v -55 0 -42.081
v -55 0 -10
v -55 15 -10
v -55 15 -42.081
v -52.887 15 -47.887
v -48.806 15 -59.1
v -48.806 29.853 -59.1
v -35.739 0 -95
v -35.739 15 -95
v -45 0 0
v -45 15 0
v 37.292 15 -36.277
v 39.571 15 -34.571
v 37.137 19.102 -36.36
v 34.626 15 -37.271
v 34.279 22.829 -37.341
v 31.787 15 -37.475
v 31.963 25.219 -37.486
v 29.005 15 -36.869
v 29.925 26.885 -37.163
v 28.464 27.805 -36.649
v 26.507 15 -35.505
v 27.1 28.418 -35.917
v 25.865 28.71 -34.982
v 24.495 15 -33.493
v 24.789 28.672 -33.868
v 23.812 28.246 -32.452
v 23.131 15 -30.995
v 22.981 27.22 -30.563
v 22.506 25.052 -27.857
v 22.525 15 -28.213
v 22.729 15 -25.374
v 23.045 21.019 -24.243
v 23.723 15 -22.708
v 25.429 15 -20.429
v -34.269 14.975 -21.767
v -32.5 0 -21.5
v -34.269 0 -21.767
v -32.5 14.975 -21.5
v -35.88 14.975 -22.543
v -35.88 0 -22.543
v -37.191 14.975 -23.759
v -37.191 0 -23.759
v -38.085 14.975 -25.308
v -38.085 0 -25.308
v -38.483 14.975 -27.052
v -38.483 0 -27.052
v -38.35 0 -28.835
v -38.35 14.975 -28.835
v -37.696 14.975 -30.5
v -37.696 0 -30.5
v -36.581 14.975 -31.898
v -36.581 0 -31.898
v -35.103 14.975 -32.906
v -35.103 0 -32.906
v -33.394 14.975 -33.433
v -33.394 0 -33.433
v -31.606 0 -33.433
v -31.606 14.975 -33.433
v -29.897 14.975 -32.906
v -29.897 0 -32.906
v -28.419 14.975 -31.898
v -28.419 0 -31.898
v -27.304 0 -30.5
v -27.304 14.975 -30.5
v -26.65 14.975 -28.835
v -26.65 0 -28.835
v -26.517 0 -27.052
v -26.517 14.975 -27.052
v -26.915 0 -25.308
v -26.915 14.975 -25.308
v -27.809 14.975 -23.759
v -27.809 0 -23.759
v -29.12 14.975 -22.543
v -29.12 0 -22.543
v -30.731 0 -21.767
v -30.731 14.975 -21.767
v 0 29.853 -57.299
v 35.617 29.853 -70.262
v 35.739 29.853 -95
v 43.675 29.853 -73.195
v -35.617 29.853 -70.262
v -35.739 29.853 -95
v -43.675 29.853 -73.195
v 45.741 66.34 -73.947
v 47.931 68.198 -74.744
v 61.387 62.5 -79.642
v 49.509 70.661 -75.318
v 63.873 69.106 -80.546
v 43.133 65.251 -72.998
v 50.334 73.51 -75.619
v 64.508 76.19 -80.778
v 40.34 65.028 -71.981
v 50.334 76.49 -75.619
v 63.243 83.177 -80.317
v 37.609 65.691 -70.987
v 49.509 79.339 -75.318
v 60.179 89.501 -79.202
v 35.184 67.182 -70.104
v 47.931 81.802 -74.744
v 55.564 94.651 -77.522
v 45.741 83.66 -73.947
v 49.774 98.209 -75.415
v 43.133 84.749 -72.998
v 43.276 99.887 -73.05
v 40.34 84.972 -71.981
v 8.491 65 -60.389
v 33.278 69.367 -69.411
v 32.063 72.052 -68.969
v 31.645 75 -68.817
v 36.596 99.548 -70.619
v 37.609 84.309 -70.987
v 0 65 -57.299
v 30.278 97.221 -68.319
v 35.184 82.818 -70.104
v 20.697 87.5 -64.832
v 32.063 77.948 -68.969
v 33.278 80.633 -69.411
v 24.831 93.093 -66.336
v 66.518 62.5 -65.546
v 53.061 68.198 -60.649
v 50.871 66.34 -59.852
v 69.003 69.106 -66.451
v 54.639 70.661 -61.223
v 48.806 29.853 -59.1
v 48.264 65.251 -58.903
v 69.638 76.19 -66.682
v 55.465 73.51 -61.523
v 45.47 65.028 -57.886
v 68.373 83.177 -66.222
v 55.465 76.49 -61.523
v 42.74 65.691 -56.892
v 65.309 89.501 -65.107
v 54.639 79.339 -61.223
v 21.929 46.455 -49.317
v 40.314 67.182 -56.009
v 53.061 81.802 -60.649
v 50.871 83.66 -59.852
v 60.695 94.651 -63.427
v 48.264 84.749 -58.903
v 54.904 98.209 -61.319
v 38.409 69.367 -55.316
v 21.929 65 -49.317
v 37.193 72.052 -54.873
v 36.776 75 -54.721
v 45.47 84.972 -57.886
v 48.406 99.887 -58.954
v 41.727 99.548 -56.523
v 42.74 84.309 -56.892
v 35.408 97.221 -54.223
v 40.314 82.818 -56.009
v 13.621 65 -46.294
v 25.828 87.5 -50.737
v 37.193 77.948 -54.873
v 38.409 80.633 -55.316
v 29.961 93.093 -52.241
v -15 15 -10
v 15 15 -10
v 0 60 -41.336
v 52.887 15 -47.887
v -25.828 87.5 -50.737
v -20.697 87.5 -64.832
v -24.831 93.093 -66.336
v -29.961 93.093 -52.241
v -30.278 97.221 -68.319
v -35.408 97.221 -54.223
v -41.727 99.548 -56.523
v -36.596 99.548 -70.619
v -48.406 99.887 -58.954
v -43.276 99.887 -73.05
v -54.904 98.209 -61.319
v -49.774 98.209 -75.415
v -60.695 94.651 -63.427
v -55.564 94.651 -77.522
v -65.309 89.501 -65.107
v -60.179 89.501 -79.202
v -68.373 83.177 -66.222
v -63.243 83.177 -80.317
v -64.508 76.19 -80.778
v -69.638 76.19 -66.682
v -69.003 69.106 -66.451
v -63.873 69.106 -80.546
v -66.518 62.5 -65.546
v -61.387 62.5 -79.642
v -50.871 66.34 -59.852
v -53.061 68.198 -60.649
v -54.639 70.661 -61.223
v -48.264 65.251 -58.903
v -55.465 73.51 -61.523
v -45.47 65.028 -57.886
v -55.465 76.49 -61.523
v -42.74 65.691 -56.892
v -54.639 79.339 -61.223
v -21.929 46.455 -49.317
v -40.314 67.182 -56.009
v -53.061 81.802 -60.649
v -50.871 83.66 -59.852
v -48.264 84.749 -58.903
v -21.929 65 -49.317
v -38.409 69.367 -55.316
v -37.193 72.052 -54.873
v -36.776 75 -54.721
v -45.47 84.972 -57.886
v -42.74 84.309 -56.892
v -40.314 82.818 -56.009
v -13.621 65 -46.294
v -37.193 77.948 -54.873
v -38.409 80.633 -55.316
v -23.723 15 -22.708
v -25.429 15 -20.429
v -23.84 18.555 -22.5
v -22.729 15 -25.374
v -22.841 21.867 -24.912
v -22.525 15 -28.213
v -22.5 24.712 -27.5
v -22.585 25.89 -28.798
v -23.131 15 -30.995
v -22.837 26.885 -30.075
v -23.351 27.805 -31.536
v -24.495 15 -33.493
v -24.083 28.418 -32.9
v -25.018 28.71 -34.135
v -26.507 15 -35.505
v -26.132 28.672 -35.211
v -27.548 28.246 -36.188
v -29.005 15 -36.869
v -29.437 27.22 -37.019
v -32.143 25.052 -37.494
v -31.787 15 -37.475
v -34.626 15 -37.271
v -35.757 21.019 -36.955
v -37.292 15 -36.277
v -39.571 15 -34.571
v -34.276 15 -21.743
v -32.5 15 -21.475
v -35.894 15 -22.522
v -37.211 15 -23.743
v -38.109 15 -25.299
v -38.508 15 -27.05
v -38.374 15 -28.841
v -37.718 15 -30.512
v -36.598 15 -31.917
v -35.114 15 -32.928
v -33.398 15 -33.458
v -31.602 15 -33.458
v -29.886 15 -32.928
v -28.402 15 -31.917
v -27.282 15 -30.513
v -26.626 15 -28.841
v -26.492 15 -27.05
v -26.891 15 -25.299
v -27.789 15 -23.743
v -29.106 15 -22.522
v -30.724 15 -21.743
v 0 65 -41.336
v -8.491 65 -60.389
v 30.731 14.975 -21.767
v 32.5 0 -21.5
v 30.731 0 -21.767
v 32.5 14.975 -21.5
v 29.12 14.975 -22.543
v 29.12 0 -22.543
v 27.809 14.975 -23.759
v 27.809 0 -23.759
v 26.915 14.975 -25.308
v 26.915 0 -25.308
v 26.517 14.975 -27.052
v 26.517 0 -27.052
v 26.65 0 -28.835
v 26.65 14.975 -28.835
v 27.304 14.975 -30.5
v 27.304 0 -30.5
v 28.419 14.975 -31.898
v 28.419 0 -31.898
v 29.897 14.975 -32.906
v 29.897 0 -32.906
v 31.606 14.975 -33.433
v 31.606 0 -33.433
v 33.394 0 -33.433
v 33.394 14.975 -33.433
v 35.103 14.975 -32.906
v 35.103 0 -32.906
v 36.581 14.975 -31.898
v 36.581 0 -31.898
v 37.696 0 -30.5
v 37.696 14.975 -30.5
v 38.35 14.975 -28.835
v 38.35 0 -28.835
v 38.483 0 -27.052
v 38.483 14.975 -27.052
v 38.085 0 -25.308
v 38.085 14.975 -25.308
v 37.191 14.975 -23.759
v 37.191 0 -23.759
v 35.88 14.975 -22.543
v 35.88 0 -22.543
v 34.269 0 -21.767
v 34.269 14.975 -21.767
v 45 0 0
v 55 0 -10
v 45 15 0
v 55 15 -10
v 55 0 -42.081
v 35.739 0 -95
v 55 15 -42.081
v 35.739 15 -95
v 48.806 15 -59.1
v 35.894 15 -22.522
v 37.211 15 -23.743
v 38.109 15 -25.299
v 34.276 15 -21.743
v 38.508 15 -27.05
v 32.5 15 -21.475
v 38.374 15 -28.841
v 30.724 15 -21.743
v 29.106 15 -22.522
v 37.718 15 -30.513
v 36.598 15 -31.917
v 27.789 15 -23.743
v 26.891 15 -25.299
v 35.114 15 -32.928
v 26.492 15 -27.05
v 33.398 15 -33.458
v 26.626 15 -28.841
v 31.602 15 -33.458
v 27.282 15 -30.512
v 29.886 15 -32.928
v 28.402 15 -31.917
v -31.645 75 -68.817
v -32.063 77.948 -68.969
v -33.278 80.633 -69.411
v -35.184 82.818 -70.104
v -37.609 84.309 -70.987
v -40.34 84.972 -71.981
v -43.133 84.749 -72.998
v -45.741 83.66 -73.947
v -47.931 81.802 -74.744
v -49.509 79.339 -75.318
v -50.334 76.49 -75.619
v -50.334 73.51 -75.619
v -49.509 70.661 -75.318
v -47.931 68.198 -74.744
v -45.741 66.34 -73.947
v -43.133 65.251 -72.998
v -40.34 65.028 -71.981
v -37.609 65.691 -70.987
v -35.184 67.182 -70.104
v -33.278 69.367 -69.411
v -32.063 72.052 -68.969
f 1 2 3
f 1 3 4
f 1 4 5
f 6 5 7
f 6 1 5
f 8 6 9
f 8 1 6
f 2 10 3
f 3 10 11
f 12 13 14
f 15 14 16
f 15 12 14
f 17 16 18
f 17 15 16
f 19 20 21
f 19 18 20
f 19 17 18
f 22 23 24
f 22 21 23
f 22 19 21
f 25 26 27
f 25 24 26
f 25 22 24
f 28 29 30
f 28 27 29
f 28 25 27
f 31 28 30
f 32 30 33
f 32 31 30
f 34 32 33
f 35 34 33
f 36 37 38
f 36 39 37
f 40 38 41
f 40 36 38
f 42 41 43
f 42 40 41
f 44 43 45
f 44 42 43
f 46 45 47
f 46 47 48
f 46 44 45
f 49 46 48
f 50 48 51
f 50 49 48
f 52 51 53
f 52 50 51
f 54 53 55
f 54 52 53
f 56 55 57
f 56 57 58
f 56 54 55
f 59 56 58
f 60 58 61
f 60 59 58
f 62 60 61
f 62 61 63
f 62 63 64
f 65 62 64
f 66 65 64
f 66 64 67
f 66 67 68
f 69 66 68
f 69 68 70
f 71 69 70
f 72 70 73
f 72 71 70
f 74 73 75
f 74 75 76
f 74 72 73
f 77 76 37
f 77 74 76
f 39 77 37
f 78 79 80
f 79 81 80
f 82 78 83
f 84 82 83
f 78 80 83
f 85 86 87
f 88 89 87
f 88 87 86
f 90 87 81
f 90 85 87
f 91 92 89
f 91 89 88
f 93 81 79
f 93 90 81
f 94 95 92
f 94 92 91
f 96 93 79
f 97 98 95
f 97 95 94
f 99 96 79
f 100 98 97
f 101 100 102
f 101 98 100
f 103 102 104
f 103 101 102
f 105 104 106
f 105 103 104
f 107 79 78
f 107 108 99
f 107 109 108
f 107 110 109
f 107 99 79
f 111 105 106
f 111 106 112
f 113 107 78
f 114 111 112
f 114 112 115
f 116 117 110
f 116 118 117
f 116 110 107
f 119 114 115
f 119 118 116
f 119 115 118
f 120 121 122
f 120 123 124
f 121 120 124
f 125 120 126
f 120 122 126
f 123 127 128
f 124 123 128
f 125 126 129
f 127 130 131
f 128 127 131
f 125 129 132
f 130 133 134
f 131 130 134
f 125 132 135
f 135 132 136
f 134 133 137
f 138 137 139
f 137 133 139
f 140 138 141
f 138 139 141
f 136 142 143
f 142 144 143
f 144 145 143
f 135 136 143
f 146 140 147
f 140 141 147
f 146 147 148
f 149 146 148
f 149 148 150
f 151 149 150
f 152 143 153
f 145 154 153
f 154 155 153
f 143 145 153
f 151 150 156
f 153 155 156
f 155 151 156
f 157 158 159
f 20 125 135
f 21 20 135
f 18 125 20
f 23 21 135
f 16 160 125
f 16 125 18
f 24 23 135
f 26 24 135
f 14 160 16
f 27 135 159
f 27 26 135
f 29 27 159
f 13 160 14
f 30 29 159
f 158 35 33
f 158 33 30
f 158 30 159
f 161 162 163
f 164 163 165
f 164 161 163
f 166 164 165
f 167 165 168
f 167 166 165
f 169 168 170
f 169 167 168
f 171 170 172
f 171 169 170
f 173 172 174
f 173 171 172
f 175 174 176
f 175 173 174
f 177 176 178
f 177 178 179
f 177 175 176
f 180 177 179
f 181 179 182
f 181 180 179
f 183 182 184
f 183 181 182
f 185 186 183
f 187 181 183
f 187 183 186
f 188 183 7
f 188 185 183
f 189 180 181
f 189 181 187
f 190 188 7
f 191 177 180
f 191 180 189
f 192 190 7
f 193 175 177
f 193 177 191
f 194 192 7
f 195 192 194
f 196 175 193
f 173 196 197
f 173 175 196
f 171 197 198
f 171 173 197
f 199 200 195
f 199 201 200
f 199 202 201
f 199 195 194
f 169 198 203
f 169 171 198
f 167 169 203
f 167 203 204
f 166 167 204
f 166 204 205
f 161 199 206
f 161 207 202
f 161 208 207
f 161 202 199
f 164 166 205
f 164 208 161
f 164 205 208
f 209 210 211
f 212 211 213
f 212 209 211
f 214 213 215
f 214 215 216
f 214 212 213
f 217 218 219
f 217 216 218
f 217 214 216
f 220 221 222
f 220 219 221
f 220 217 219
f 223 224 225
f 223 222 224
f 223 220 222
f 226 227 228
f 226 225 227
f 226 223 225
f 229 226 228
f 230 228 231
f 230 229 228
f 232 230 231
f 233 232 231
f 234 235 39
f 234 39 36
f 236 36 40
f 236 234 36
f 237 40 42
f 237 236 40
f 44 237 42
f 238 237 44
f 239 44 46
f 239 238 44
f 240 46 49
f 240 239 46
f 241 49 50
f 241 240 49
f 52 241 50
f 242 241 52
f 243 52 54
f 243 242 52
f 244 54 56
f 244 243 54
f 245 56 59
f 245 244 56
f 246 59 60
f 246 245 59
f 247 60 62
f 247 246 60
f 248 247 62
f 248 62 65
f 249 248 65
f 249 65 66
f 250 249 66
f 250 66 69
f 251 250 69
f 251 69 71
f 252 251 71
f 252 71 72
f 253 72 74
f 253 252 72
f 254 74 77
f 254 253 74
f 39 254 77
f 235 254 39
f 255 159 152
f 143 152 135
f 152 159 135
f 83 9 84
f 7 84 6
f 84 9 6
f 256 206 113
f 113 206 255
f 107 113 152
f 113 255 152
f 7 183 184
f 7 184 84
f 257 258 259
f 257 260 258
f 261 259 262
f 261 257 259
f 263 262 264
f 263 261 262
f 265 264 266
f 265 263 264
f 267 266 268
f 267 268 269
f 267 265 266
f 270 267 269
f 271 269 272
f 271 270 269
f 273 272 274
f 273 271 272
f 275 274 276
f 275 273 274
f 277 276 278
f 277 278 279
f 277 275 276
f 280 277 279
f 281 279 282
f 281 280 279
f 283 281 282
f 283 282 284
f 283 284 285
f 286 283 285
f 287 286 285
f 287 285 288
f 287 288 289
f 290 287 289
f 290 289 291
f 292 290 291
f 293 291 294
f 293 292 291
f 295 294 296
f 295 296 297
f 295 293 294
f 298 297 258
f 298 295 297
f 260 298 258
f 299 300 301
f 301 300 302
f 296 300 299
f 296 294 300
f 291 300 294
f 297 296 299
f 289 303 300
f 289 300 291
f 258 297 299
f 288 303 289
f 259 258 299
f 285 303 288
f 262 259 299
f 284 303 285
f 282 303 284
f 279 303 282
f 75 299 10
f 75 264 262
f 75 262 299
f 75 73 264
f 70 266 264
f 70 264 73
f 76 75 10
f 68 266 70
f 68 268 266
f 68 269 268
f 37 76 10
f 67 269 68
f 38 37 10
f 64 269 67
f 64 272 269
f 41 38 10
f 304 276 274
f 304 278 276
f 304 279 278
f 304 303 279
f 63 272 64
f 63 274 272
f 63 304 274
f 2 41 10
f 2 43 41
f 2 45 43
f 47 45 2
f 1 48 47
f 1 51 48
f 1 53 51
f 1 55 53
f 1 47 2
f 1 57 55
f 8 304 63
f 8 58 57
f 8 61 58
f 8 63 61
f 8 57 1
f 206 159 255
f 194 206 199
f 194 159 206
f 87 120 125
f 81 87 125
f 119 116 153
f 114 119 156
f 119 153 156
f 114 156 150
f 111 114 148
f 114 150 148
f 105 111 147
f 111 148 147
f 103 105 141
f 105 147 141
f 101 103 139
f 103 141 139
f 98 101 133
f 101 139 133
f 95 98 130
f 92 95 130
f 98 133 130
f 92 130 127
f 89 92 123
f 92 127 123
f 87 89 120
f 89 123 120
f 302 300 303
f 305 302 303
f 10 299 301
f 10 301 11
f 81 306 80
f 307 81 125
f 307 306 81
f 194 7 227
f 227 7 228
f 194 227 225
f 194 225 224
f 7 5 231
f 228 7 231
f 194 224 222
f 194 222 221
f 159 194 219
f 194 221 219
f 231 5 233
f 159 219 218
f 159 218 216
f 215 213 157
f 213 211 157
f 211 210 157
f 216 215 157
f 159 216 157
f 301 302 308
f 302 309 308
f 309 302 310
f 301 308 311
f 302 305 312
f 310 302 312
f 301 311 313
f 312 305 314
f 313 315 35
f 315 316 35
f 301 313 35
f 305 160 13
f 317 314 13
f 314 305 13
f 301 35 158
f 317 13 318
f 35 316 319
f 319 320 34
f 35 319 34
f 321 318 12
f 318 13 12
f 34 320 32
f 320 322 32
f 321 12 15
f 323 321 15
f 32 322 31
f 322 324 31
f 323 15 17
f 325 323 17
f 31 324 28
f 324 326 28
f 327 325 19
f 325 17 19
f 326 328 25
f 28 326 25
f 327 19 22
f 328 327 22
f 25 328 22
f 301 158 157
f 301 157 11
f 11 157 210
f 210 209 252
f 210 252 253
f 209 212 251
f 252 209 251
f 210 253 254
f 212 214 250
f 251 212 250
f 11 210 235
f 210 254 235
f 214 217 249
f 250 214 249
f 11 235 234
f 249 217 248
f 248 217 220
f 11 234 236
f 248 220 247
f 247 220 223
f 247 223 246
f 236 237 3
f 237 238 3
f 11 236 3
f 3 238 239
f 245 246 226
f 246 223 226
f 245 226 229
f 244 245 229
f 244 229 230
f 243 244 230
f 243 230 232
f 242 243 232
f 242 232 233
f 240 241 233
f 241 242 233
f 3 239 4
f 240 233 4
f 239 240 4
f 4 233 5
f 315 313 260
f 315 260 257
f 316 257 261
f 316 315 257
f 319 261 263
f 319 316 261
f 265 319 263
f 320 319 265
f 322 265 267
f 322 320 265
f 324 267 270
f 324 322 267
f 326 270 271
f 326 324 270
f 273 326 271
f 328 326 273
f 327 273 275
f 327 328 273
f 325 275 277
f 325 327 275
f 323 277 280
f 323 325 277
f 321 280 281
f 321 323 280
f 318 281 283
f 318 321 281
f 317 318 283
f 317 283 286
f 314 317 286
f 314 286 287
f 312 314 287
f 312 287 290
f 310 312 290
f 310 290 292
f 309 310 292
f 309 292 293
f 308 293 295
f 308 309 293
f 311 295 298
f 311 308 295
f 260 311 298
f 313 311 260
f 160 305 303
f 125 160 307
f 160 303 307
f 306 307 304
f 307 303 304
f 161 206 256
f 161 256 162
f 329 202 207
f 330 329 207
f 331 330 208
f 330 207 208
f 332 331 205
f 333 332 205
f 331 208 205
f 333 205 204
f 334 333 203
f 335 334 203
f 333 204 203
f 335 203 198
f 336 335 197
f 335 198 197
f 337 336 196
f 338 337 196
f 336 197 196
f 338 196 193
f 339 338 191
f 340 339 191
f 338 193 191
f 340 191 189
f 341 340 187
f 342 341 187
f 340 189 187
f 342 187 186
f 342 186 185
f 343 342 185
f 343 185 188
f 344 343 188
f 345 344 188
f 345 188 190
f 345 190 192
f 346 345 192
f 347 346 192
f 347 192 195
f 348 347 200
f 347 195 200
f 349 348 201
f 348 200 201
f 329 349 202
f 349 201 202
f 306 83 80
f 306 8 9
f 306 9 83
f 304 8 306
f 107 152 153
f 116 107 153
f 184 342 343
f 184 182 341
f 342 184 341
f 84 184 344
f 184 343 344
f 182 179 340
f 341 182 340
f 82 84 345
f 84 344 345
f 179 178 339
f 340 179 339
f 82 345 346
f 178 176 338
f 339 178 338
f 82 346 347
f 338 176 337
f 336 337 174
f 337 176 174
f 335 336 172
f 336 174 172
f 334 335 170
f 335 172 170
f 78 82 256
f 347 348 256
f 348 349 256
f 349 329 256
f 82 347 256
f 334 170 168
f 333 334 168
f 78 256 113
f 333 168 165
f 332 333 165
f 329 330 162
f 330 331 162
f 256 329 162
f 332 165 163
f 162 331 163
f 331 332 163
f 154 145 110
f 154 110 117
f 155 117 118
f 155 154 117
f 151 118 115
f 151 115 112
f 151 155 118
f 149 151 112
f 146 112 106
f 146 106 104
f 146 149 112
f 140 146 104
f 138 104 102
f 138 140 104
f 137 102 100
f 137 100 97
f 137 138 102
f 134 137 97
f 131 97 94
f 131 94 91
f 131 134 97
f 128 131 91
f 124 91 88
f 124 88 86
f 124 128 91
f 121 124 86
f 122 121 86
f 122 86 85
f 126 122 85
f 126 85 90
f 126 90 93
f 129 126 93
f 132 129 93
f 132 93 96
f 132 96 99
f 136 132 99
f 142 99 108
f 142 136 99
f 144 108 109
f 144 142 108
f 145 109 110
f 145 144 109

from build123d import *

# Parameters (mm, degrees)
SKETCH1_W                           = 110
SKETCH1_H                           = 95
BOSS_EXTRUDE1_DEPTH                 = 15
SKETCH6_R                           = 25
SKETCH6_R_2                         = 10
BOSS_EXTRUDE7_DEPTH                 = 15
DELETEFACE4_START                   = 15
DELETEFACE4_DEPTH                   = 50
CUT_EXTRUDE1_DEPTH                  = 29.85315
BOSS_EXTRUDE8_DEPTH                 = 14.85315
F_12_0_12_DIAMETER_HOLE1_AT_2_COUNT = 2
F_12_0_12_DIAMETER_HOLE1_AT_2_PITCH = 65
SKETCH17_R                          = 10
CUT_EXTRUDE2_DEPTH                  = 15
CHAMFER1_SIZE                       = 10


# Read off the part's stored shape, not the designer's step: DeleteFace4
with BuildPart() as part:
    # Sketch1 → Boss-Extrude1 (new body)
    with BuildSketch(Plane(origin=(0, 0, 0), x_dir=(1, 0, 0), z_dir=(0, 1, 0))):
        with Locations((0, 47.5)):
            Rectangle(SKETCH1_W, SKETCH1_H)
    extrude(amount=BOSS_EXTRUDE1_DEPTH)

    # Sketch6 → Boss-Extrude7 (add)
    # profile 1 of 3: a face of its own
    with BuildSketch(Plane(origin=(-46.172719349, 75, -58.141496194), x_dir=(0.9396926207859081, 0, 0.34202014332566977), z_dir=(-0.3420201433256697, 0, 0.939692620785908))):
        Circle(SKETCH6_R)
        Circle(SKETCH6_R_2, mode=Mode.SUBTRACT)
    # profile 2 of 3: a face of its own
    with BuildSketch(Plane(origin=(-46.172719349, 75, -58.141496194), x_dir=(0.9396926207859081, 0, 0.34202014332566977), z_dir=(-0.3420201433256697, 0, 0.939692620785908))):
        with BuildLine():
            ThreePointArc((25, 0), (6.470476128, -24.148145657), (-21.650635095, -12.5))
            Line((-21.650635095, -12.5), (5.773502692, -60))
            Line((5.773502692, -60), (63.508529611, -60))
            Line((63.508529611, -60), (34.641016151, -10))
            Line((34.641016151, -10), (21.650635095, 12.5))
            ThreePointArc((21.650635095, 12.5), (24.148145657, 6.470476128), (25, 0))
        make_face()
    # profile 3 of 3: a face of its own
    with BuildSketch(Plane(origin=(-46.172719349, 75, -58.141496194), x_dir=(0.9396926207859081, 0, 0.34202014332566977), z_dir=(-0.3420201433256697, 0, 0.939692620785908))):
        Polygon((34.641016151, -10), (63.508529611, -60), (84.985310553, -60), (84.985310553, -10), align=None)
    boss_extrude7 = extrude(amount=-BOSS_EXTRUDE7_DEPTH)

    # Mirror1: Boss-Extrude7 across plane
    add(boss_extrude7.mirror(Plane(origin=(0, 0, 0), x_dir=(0, 0, 1), z_dir=(1, 0, 0))))

    # DeleteFace4 outline → DeleteFace4 (cut)
    with BuildSketch(Plane(origin=(0, 0, 0), x_dir=(1, 0, 0), z_dir=(0, 1, 0)).offset(DELETEFACE4_START)):
        Polygon((21.928533001, 49.317334009), (0, 41.336000716), (33.687349853, 29.074808098), (38.817652003, 43.17019741), align=None)
        Polygon((0, 41.336000716), (-21.928533001, 49.317334009), (-38.817652003, 43.17019741), (-33.687349853, 29.074808098), align=None)
    extrude(amount=DELETEFACE4_DEPTH, mode=Mode.SUBTRACT)

    # Sketch8 → Loft1 section 0
    with BuildSketch(Plane(origin=(0, 15, 0), x_dir=(1, 0, 0), z_dir=(0, 1, 0)), mode=Mode.PRIVATE) as loft1_s0:
        with BuildLine():
            Line((-15, 10), (15, 10))
            Line((15, 10), (72.85193746, 67.85193746))
            Line((72.85193746, 67.85193746), (0, 41.336000716))
            Line((0, 41.336000716), (-72.85193746, 67.85193746))
            Line((-72.85193746, 67.85193746), (-15, 10))
        make_face()
    loft([Vertex(0, 60, -41.336000716), loft1_s0.sketch])

    # Sketch13 → Cut-Extrude1 (cut)
    with BuildSketch(Plane(origin=(0, 0, 0), x_dir=(1, 0, 0), z_dir=(0, 1, 0))):
        Polygon((-55, 95), (-55, 42.081139662), (-35.739110006, 95), align=None)
    extrude(amount=CUT_EXTRUDE1_DEPTH, mode=Mode.SUBTRACT)


with BuildPart() as cut_extrude1_kept_piece:
    # of the separate pieces the step leaves, the one the design keeps (cut_extrude1_pieces_kept)
    add(part.part.solids().sort_by_distance((-55, 0, 0))[0])

    # Sketch14 → Boss-Extrude8 (add)
    with BuildSketch(Plane(origin=(0, 15, 0), x_dir=(1, 0, 0), z_dir=(0, 1, 0))):
        Polygon((0, 57.298667303), (0, 95), (-35.739110006, 95), (-48.805705227, 59.099824681), (-40.747401473, 56.166841976), (-35.617099323, 70.262231288), align=None)
    extrude(amount=BOSS_EXTRUDE8_DEPTH)

    # SurfaceCut2
    split(bisect_by=Plane(origin=(0, 0, 0), x_dir=(0, 0, -1), z_dir=(1, 0, 0)), keep=Keep.BOTTOM)

    # Mirror3: Cut-Extrude1 kept piece across plane


with BuildPart() as cut_extrude1_kept_piece_1:
    add(cut_extrude1_kept_piece.part)
    add(cut_extrude1_kept_piece.part.mirror(Plane(origin=(0, 0, 0), x_dir=(0, 0, 1), z_dir=(1, 0, 0))))

    # Sketch16 → Ø12.0 (12) Diameter Hole1 (revolve, cut)
    with BuildSketch(Plane(origin=(32.5, 15, -27.5), x_dir=(0, 0, 1), z_dir=(1, 0, 0))):
        Polygon((0, 0), (0, 15), (6, 15), (6, 0.025), (6.025, 0), align=None)
    f_12_0_12_diameter_hole1 = revolve(axis=Axis((32.5, 21.35, -27.5), (0, -1, 0)), mode=Mode.SUBTRACT)

    # Ø12.0 (12) Diameter Hole1 at 2: Ø12.0 (12) Diameter Hole1 ×2
    with Locations(*[(-i * F_12_0_12_DIAMETER_HOLE1_AT_2_PITCH, 0, 0) for i in range(1, F_12_0_12_DIAMETER_HOLE1_AT_2_COUNT)]):
        add(f_12_0_12_diameter_hole1, mode=Mode.SUBTRACT)

    # Sketch17 → Cut-Extrude2 (cut)
    with BuildSketch(Plane(origin=(0, 15, 0), x_dir=(1, 0, 0), z_dir=(0, 1, 0))):
        with Locations((-32.5, 27.5)):
            Circle(SKETCH17_R)
        with Locations((32.5, 27.5)):
            Circle(SKETCH17_R)
    extrude(amount=CUT_EXTRUDE2_DEPTH, mode=Mode.SUBTRACT)

    # Chamfer1
    chamfer1_edges = [cut_extrude1_kept_piece_1.edges().sort_by_distance(p)[0] for p in [
        (-55, 7.5, 0),
        (55, 7.5, 0),
    ]]
    chamfer(chamfer1_edges, length=CHAMFER1_SIZE)


solid = cut_extrude1_kept_piece_1.part
